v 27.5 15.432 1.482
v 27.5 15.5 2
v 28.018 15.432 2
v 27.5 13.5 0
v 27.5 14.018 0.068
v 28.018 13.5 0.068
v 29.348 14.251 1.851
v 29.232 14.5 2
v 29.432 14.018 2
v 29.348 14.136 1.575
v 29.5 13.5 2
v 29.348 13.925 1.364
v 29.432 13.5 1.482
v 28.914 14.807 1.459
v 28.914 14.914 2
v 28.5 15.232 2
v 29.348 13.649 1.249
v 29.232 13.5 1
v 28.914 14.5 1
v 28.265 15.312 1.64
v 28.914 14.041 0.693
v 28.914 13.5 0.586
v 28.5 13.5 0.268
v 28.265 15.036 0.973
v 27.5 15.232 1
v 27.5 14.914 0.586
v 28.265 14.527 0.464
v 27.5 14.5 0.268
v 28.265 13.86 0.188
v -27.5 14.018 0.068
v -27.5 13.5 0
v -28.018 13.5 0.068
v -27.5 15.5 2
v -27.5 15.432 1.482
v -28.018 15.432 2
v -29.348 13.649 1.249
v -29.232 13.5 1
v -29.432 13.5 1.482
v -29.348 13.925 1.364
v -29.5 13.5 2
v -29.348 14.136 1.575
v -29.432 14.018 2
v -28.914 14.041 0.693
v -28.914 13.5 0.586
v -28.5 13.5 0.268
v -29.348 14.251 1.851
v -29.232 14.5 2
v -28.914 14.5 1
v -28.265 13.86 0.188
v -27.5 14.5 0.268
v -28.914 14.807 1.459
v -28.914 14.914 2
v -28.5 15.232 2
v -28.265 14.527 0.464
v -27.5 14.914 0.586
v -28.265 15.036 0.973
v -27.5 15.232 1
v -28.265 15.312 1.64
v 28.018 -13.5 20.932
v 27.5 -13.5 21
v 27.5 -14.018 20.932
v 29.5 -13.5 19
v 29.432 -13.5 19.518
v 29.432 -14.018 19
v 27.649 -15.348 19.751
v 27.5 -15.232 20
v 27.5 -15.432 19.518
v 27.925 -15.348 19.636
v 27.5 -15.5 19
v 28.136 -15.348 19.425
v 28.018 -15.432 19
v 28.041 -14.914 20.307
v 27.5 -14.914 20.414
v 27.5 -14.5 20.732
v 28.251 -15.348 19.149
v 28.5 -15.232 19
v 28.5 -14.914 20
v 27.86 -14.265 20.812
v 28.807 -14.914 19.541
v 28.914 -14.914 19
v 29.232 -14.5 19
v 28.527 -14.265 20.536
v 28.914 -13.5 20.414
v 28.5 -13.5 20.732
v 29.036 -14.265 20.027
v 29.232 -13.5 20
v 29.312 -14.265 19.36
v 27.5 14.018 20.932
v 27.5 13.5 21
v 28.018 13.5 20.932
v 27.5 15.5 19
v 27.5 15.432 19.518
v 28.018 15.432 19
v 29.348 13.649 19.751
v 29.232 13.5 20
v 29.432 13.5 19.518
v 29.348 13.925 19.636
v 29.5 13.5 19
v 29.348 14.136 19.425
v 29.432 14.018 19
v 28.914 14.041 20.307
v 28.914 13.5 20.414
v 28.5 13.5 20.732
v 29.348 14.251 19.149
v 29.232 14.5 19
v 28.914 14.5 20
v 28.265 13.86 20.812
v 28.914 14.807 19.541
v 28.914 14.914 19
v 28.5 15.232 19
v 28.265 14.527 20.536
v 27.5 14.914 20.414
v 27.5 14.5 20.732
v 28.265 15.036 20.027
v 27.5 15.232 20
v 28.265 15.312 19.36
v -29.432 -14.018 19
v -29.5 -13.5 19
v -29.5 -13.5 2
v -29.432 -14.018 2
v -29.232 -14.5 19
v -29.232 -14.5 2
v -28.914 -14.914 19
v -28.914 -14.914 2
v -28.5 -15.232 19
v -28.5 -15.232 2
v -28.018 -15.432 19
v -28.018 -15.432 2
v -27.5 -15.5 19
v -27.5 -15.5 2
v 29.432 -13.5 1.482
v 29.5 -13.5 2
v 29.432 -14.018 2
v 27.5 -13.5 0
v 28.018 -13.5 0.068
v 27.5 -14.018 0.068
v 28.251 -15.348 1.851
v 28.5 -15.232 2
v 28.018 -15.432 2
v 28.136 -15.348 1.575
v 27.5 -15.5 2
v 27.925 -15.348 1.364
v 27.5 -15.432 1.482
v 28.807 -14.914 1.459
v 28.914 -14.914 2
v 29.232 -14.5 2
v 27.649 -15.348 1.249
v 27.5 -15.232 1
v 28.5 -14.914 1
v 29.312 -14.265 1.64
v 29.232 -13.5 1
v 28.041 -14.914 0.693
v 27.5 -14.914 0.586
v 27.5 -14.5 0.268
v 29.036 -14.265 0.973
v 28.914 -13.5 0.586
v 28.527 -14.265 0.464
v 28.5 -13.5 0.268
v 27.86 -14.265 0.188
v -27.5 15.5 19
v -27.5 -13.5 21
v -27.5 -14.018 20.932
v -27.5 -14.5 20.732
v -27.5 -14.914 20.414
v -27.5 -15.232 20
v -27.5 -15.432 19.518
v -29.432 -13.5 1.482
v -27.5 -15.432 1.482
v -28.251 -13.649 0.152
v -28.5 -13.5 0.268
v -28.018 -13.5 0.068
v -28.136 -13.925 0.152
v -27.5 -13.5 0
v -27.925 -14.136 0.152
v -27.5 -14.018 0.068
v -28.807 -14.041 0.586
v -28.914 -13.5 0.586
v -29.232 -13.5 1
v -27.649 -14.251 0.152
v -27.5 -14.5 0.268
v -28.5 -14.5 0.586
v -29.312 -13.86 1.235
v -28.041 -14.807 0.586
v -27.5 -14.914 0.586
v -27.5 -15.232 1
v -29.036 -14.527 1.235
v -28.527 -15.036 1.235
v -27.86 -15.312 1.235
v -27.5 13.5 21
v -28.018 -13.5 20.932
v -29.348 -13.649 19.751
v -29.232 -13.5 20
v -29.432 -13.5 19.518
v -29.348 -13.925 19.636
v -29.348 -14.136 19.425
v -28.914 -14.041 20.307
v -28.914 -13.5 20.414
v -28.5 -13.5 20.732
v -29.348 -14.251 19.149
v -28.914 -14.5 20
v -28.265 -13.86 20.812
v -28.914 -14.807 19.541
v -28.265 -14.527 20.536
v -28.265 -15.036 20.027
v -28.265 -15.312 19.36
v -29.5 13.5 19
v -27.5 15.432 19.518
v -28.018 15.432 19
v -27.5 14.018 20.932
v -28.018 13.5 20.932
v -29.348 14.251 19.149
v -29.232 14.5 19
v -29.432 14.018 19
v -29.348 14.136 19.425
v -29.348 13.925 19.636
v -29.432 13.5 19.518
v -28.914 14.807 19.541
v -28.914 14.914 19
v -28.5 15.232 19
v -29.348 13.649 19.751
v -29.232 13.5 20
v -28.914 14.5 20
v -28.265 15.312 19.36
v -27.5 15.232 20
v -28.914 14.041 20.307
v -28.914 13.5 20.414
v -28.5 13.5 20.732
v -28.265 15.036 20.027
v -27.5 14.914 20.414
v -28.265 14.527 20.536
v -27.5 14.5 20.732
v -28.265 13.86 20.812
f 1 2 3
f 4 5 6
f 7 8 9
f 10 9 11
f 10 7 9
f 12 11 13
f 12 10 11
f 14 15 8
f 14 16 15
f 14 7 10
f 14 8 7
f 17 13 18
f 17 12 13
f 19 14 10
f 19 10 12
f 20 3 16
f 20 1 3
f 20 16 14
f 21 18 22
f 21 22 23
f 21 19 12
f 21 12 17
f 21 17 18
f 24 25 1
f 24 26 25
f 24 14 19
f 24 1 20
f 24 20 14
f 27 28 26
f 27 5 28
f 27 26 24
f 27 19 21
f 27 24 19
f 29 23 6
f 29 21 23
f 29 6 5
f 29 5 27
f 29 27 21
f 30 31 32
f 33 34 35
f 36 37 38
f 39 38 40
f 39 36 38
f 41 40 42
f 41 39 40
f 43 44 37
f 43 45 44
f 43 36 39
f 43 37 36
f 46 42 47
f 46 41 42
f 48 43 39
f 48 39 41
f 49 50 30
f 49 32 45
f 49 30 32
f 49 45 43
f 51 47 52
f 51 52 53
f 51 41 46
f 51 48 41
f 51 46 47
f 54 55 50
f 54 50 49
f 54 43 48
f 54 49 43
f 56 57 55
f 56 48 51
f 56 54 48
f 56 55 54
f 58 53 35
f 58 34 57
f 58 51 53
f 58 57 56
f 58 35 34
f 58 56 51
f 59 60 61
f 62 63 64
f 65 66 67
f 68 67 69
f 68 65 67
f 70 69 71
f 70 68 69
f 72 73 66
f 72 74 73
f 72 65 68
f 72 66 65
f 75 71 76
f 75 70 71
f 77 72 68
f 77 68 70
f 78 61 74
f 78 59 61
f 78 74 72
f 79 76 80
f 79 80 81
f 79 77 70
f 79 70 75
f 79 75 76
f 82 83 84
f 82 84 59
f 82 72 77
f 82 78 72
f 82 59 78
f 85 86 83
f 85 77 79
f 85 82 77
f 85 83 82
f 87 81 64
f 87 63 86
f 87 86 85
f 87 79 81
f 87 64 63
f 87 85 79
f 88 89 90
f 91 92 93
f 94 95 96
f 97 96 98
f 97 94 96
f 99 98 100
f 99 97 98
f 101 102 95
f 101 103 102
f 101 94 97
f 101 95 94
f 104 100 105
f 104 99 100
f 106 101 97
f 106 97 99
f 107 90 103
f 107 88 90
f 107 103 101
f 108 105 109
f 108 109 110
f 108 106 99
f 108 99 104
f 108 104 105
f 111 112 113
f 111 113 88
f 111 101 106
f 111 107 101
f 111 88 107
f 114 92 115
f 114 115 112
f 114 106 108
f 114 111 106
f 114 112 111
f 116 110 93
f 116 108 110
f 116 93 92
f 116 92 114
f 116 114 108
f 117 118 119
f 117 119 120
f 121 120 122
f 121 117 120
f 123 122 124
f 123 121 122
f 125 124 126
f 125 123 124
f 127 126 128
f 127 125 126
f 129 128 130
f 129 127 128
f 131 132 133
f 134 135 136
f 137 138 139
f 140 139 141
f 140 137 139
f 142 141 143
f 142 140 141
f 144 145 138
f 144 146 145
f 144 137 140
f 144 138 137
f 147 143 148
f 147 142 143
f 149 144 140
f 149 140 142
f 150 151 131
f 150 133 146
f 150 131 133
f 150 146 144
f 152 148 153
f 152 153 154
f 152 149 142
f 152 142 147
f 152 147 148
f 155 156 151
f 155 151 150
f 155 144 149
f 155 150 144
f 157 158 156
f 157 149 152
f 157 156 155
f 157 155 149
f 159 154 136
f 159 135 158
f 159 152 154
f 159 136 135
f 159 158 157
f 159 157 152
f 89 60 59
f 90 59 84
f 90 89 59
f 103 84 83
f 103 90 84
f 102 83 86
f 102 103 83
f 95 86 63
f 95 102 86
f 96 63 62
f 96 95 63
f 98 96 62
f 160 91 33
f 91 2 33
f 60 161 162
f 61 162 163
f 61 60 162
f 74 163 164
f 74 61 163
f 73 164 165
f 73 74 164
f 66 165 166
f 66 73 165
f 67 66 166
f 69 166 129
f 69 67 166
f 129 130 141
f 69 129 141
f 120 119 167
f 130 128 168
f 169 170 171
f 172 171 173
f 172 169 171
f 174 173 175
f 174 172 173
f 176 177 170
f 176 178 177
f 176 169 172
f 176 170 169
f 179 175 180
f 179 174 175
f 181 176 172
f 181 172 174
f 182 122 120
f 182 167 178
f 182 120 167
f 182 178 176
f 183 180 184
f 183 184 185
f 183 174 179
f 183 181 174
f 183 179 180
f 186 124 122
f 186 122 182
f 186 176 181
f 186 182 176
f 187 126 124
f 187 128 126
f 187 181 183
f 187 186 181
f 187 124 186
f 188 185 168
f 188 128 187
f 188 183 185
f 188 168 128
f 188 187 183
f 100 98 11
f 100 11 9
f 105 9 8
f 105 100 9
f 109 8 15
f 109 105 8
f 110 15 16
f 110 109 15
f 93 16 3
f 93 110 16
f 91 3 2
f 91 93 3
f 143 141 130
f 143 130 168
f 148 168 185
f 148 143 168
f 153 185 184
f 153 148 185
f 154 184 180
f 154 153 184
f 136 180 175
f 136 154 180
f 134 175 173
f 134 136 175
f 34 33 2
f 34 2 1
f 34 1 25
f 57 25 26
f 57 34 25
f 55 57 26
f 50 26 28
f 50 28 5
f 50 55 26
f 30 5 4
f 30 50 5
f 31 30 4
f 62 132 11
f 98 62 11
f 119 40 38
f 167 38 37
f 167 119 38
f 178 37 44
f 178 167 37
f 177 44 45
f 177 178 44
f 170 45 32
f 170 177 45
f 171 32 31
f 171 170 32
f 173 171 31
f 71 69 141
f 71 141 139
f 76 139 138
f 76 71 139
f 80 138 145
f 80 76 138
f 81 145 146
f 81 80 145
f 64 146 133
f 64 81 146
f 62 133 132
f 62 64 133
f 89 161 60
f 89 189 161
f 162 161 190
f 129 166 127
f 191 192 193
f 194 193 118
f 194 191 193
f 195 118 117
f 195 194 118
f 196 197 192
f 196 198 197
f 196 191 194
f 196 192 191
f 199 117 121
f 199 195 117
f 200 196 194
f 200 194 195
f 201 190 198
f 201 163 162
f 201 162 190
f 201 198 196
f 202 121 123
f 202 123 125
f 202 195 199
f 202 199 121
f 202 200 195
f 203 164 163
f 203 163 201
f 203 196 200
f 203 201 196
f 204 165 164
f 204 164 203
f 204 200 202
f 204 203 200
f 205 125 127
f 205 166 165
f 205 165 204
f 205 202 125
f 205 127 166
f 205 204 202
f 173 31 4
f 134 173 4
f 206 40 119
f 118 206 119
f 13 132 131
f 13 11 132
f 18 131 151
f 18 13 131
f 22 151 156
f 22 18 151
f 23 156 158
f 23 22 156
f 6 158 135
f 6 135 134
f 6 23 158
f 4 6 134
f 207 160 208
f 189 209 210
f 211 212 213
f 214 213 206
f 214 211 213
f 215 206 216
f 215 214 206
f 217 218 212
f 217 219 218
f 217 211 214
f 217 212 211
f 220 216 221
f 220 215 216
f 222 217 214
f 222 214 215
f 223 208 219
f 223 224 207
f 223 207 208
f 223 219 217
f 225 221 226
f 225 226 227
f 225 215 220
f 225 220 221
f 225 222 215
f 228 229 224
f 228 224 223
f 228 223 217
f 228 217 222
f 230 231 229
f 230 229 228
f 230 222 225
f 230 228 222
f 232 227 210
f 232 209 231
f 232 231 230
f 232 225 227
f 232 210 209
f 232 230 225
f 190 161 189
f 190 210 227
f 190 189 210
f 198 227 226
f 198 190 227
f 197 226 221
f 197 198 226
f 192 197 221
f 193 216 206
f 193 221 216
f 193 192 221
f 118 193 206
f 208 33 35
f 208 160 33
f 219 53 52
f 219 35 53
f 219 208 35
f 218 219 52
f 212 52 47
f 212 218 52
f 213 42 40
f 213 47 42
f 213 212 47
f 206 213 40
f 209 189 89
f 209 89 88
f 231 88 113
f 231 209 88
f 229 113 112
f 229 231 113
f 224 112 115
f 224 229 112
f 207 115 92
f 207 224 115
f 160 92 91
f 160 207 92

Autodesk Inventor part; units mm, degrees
ref_plane "YZ Plane" through (0, 0, 0) normal (1, 0, 0) x (0, 1, 0)
ref_plane "XZ Plane" through (0, 0, 0) normal (0, 1, 0) x (-1, 0, 0)
ref_plane "XY Plane" through (0, 0, 0) normal (0, 0, 1) x (1, 0, 0)
sketch "Sketch1" plane through (0, 0, 0) normal (0, 0, 1) x (1, 0, 0)
  line L0 (0, -21.7) -> (0, 21.7) construction
  line L1 (-41.3, 0) -> (41.3, 0) construction
  line L2 (-29.5, -15.5) -> (29.5, -15.5)
  line L3 (29.5, -15.5) -> (29.5, 15.5)
  line L4 (29.5, 15.5) -> (-29.5, 15.5)
  line L5 (-29.5, 15.5) -> (-29.5, -15.5)
  line L6 (-29.5, -15.5) -> (29.5, 15.5) construction
  line L7 (29.5, -15.5) -> (-29.5, 15.5) construction
  point P0 (0, 0)
  dimension "d0" = 59
  dimension "d1" = 31
extrude "Extrusion1" add sketch "Sketch1" along normal blind 21
fillet "Fillet1" radius 2 12 edges at (0, 15.5, 21) (0, 15.5, 0) (29.5, 15.5, 10.5) (29.5, 0, 21) (29.5, 0, 0) (29.5, -15.5, 10.5) (0, -15.5, 21) (-29.5, 0, 21) (-29.5, -15.5, 10.5) (-29.5, 0, 0) (0, -15.5, 0) (-29.5, 15.5, 10.5)
properties part number "Battery Pack"
